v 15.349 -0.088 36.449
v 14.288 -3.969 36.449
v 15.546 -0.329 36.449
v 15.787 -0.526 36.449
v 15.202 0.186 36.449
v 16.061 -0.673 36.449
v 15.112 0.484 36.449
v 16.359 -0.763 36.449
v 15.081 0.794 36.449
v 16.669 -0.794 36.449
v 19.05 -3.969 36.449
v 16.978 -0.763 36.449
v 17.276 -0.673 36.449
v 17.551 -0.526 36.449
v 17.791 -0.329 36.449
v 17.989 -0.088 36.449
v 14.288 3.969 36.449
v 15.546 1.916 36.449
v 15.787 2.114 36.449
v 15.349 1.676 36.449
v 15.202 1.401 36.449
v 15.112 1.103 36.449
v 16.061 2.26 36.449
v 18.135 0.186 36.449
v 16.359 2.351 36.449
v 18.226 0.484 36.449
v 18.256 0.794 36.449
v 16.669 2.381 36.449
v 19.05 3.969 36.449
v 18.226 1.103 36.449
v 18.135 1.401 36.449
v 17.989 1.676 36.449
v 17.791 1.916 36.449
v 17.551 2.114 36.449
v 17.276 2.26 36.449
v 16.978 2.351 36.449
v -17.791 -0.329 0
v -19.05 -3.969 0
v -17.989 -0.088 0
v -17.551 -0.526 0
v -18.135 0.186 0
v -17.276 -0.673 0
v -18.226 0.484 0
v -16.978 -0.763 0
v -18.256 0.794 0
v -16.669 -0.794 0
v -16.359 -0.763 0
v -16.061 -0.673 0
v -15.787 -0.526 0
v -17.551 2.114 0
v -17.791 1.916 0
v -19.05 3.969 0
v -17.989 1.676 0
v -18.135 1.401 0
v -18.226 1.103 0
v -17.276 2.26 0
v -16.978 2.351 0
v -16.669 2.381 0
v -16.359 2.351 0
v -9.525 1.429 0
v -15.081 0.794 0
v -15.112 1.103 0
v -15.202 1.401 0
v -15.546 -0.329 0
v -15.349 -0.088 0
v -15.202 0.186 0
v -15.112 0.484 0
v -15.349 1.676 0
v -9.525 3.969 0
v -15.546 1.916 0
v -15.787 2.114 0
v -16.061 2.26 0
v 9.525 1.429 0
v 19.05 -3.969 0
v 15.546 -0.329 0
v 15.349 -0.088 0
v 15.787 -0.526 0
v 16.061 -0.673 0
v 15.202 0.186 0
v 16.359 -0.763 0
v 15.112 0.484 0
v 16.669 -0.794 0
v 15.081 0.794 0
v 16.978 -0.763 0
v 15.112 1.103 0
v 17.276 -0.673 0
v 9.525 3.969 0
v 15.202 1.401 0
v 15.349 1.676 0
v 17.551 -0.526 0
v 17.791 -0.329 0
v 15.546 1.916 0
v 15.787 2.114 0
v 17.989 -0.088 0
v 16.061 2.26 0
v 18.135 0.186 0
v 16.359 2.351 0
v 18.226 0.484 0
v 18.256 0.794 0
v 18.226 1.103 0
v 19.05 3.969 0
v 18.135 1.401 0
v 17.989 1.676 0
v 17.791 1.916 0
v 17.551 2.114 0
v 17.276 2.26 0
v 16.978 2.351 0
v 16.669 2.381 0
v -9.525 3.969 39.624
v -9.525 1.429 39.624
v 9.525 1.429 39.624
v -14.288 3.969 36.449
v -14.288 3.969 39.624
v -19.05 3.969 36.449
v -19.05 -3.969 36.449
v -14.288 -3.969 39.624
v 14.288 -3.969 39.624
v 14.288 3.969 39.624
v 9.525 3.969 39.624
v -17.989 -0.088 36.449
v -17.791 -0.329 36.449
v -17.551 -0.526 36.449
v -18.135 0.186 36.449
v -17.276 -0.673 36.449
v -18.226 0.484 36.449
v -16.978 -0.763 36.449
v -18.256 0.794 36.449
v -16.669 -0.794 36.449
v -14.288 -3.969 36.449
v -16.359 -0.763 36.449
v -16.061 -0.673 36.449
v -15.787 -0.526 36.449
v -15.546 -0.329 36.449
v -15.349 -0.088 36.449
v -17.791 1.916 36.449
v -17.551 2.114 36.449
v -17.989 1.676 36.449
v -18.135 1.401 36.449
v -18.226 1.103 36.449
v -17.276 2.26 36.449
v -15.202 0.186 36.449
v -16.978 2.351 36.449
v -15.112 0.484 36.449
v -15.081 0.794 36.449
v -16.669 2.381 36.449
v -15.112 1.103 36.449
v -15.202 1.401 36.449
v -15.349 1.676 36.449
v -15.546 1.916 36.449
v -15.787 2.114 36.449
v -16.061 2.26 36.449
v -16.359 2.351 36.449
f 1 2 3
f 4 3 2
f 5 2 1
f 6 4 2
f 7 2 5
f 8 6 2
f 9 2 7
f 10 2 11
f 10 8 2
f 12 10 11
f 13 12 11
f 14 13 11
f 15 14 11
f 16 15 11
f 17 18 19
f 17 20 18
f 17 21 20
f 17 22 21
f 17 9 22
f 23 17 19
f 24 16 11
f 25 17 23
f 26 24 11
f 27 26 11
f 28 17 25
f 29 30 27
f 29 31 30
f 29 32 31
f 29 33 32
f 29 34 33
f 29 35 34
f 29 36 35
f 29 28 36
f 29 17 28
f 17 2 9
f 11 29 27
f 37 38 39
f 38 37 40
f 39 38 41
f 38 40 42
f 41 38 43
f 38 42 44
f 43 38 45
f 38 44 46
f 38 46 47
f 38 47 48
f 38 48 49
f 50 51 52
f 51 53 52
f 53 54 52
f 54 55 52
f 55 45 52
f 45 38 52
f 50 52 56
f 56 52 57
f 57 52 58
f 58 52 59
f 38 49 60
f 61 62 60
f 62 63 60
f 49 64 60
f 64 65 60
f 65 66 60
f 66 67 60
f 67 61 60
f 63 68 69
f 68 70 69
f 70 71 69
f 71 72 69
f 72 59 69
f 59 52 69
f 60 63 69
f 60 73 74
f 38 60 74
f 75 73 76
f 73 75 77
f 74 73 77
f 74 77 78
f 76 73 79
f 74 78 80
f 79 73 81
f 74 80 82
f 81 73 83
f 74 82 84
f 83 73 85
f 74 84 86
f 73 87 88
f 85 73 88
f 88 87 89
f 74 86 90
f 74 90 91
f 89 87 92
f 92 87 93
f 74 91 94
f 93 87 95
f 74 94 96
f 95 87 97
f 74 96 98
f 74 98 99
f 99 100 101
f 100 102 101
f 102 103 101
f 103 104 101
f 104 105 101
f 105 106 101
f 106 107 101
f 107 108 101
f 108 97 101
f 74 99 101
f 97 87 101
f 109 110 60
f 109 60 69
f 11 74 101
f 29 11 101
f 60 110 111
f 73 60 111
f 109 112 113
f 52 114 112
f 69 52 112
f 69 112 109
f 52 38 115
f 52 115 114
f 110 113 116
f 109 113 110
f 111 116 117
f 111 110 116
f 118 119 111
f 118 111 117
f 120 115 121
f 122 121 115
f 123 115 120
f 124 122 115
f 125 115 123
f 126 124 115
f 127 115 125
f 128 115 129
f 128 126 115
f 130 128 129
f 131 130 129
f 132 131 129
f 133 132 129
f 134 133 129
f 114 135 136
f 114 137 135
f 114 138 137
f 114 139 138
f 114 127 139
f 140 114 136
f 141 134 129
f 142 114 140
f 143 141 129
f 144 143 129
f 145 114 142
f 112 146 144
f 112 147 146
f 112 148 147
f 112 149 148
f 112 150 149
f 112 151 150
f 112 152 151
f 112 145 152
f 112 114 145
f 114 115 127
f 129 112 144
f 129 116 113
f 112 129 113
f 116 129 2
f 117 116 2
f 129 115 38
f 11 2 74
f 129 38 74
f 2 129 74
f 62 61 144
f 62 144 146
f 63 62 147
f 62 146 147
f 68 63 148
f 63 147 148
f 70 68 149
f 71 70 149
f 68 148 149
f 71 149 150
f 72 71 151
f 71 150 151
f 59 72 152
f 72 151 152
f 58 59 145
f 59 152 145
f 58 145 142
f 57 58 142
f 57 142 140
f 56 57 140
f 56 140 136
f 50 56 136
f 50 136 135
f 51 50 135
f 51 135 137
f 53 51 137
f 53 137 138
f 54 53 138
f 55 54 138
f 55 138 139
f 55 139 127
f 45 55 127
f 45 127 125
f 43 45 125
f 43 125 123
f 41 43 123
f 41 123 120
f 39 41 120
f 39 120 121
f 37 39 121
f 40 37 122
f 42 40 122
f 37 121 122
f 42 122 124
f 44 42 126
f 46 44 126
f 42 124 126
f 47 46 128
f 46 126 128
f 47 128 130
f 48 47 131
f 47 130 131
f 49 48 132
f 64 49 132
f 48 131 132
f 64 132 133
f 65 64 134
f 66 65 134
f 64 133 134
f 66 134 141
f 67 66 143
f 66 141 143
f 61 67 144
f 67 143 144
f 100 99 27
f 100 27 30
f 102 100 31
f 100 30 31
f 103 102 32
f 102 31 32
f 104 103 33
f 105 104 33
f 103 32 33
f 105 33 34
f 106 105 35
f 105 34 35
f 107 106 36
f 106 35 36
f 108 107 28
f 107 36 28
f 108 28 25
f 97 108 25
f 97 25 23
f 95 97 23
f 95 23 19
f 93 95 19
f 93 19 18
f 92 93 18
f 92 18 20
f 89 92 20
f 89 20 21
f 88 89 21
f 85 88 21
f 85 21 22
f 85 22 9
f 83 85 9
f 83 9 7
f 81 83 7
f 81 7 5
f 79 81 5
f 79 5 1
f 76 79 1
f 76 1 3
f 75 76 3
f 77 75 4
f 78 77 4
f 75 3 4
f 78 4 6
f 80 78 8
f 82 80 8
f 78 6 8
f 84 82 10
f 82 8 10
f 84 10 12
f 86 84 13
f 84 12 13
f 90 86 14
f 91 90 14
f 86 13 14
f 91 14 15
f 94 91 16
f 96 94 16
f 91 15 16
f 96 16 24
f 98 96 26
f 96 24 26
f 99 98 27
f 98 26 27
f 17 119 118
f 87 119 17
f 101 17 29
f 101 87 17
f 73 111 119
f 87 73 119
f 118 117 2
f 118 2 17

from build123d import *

# Parameters (mm, degrees)
SKETCH1_W                           = 38.1
SKETCH1_H                           = 7.9375
BOSS_EXTRUDE1_DEPTH                 = 39.624
SKETCH2_W                           = 19.05
SKETCH2_H                           = 2.54
CUT_EXTRUDE1_DEPTH                  = 45.144250504
F_1_8_0_125_CLEARANCE_DOWEL_HOLE1_D = 3.175
SKETCH6_W                           = 4.7625
SKETCH6_H                           = 7.9375
CUT_EXTRUDE2_DEPTH                  = 3.175


with BuildPart() as part:
    # Sketch1 → Boss-Extrude1 (new body)
    with BuildSketch(Plane.XY):
        Rectangle(SKETCH1_W, SKETCH1_H)
    extrude(amount=BOSS_EXTRUDE1_DEPTH)

    # Sketch2 → Cut-Extrude1 (cut, through all)
    with BuildSketch(Plane.XY.offset(39.624)):
        with Locations((0, 2.69875)):
            Rectangle(SKETCH2_W, SKETCH2_H)
    extrude(amount=-CUT_EXTRUDE1_DEPTH, mode=Mode.SUBTRACT)

    # 1/8 (0.125) Clearance Dowel Hole1 (through all)
    with Locations(Plane(origin=(0, 0, 0), x_dir=(-1, 0, 0), z_dir=(0, 0, -1))):
        with Locations((-16.66875, 0.79375), (16.66875, 0.79375)):
            Hole(F_1_8_0_125_CLEARANCE_DOWEL_HOLE1_D / 2)

    # Sketch6 → Cut-Extrude2 (cut)
    with BuildSketch(Plane.XY.offset(39.624)):
        with Locations((-16.66875, 0)):
            Rectangle(SKETCH6_W, SKETCH6_H)
        with Locations((16.66875, 0)):
            Rectangle(SKETCH6_W, SKETCH6_H)
    extrude(amount=-CUT_EXTRUDE2_DEPTH, mode=Mode.SUBTRACT)


solid = part.part
